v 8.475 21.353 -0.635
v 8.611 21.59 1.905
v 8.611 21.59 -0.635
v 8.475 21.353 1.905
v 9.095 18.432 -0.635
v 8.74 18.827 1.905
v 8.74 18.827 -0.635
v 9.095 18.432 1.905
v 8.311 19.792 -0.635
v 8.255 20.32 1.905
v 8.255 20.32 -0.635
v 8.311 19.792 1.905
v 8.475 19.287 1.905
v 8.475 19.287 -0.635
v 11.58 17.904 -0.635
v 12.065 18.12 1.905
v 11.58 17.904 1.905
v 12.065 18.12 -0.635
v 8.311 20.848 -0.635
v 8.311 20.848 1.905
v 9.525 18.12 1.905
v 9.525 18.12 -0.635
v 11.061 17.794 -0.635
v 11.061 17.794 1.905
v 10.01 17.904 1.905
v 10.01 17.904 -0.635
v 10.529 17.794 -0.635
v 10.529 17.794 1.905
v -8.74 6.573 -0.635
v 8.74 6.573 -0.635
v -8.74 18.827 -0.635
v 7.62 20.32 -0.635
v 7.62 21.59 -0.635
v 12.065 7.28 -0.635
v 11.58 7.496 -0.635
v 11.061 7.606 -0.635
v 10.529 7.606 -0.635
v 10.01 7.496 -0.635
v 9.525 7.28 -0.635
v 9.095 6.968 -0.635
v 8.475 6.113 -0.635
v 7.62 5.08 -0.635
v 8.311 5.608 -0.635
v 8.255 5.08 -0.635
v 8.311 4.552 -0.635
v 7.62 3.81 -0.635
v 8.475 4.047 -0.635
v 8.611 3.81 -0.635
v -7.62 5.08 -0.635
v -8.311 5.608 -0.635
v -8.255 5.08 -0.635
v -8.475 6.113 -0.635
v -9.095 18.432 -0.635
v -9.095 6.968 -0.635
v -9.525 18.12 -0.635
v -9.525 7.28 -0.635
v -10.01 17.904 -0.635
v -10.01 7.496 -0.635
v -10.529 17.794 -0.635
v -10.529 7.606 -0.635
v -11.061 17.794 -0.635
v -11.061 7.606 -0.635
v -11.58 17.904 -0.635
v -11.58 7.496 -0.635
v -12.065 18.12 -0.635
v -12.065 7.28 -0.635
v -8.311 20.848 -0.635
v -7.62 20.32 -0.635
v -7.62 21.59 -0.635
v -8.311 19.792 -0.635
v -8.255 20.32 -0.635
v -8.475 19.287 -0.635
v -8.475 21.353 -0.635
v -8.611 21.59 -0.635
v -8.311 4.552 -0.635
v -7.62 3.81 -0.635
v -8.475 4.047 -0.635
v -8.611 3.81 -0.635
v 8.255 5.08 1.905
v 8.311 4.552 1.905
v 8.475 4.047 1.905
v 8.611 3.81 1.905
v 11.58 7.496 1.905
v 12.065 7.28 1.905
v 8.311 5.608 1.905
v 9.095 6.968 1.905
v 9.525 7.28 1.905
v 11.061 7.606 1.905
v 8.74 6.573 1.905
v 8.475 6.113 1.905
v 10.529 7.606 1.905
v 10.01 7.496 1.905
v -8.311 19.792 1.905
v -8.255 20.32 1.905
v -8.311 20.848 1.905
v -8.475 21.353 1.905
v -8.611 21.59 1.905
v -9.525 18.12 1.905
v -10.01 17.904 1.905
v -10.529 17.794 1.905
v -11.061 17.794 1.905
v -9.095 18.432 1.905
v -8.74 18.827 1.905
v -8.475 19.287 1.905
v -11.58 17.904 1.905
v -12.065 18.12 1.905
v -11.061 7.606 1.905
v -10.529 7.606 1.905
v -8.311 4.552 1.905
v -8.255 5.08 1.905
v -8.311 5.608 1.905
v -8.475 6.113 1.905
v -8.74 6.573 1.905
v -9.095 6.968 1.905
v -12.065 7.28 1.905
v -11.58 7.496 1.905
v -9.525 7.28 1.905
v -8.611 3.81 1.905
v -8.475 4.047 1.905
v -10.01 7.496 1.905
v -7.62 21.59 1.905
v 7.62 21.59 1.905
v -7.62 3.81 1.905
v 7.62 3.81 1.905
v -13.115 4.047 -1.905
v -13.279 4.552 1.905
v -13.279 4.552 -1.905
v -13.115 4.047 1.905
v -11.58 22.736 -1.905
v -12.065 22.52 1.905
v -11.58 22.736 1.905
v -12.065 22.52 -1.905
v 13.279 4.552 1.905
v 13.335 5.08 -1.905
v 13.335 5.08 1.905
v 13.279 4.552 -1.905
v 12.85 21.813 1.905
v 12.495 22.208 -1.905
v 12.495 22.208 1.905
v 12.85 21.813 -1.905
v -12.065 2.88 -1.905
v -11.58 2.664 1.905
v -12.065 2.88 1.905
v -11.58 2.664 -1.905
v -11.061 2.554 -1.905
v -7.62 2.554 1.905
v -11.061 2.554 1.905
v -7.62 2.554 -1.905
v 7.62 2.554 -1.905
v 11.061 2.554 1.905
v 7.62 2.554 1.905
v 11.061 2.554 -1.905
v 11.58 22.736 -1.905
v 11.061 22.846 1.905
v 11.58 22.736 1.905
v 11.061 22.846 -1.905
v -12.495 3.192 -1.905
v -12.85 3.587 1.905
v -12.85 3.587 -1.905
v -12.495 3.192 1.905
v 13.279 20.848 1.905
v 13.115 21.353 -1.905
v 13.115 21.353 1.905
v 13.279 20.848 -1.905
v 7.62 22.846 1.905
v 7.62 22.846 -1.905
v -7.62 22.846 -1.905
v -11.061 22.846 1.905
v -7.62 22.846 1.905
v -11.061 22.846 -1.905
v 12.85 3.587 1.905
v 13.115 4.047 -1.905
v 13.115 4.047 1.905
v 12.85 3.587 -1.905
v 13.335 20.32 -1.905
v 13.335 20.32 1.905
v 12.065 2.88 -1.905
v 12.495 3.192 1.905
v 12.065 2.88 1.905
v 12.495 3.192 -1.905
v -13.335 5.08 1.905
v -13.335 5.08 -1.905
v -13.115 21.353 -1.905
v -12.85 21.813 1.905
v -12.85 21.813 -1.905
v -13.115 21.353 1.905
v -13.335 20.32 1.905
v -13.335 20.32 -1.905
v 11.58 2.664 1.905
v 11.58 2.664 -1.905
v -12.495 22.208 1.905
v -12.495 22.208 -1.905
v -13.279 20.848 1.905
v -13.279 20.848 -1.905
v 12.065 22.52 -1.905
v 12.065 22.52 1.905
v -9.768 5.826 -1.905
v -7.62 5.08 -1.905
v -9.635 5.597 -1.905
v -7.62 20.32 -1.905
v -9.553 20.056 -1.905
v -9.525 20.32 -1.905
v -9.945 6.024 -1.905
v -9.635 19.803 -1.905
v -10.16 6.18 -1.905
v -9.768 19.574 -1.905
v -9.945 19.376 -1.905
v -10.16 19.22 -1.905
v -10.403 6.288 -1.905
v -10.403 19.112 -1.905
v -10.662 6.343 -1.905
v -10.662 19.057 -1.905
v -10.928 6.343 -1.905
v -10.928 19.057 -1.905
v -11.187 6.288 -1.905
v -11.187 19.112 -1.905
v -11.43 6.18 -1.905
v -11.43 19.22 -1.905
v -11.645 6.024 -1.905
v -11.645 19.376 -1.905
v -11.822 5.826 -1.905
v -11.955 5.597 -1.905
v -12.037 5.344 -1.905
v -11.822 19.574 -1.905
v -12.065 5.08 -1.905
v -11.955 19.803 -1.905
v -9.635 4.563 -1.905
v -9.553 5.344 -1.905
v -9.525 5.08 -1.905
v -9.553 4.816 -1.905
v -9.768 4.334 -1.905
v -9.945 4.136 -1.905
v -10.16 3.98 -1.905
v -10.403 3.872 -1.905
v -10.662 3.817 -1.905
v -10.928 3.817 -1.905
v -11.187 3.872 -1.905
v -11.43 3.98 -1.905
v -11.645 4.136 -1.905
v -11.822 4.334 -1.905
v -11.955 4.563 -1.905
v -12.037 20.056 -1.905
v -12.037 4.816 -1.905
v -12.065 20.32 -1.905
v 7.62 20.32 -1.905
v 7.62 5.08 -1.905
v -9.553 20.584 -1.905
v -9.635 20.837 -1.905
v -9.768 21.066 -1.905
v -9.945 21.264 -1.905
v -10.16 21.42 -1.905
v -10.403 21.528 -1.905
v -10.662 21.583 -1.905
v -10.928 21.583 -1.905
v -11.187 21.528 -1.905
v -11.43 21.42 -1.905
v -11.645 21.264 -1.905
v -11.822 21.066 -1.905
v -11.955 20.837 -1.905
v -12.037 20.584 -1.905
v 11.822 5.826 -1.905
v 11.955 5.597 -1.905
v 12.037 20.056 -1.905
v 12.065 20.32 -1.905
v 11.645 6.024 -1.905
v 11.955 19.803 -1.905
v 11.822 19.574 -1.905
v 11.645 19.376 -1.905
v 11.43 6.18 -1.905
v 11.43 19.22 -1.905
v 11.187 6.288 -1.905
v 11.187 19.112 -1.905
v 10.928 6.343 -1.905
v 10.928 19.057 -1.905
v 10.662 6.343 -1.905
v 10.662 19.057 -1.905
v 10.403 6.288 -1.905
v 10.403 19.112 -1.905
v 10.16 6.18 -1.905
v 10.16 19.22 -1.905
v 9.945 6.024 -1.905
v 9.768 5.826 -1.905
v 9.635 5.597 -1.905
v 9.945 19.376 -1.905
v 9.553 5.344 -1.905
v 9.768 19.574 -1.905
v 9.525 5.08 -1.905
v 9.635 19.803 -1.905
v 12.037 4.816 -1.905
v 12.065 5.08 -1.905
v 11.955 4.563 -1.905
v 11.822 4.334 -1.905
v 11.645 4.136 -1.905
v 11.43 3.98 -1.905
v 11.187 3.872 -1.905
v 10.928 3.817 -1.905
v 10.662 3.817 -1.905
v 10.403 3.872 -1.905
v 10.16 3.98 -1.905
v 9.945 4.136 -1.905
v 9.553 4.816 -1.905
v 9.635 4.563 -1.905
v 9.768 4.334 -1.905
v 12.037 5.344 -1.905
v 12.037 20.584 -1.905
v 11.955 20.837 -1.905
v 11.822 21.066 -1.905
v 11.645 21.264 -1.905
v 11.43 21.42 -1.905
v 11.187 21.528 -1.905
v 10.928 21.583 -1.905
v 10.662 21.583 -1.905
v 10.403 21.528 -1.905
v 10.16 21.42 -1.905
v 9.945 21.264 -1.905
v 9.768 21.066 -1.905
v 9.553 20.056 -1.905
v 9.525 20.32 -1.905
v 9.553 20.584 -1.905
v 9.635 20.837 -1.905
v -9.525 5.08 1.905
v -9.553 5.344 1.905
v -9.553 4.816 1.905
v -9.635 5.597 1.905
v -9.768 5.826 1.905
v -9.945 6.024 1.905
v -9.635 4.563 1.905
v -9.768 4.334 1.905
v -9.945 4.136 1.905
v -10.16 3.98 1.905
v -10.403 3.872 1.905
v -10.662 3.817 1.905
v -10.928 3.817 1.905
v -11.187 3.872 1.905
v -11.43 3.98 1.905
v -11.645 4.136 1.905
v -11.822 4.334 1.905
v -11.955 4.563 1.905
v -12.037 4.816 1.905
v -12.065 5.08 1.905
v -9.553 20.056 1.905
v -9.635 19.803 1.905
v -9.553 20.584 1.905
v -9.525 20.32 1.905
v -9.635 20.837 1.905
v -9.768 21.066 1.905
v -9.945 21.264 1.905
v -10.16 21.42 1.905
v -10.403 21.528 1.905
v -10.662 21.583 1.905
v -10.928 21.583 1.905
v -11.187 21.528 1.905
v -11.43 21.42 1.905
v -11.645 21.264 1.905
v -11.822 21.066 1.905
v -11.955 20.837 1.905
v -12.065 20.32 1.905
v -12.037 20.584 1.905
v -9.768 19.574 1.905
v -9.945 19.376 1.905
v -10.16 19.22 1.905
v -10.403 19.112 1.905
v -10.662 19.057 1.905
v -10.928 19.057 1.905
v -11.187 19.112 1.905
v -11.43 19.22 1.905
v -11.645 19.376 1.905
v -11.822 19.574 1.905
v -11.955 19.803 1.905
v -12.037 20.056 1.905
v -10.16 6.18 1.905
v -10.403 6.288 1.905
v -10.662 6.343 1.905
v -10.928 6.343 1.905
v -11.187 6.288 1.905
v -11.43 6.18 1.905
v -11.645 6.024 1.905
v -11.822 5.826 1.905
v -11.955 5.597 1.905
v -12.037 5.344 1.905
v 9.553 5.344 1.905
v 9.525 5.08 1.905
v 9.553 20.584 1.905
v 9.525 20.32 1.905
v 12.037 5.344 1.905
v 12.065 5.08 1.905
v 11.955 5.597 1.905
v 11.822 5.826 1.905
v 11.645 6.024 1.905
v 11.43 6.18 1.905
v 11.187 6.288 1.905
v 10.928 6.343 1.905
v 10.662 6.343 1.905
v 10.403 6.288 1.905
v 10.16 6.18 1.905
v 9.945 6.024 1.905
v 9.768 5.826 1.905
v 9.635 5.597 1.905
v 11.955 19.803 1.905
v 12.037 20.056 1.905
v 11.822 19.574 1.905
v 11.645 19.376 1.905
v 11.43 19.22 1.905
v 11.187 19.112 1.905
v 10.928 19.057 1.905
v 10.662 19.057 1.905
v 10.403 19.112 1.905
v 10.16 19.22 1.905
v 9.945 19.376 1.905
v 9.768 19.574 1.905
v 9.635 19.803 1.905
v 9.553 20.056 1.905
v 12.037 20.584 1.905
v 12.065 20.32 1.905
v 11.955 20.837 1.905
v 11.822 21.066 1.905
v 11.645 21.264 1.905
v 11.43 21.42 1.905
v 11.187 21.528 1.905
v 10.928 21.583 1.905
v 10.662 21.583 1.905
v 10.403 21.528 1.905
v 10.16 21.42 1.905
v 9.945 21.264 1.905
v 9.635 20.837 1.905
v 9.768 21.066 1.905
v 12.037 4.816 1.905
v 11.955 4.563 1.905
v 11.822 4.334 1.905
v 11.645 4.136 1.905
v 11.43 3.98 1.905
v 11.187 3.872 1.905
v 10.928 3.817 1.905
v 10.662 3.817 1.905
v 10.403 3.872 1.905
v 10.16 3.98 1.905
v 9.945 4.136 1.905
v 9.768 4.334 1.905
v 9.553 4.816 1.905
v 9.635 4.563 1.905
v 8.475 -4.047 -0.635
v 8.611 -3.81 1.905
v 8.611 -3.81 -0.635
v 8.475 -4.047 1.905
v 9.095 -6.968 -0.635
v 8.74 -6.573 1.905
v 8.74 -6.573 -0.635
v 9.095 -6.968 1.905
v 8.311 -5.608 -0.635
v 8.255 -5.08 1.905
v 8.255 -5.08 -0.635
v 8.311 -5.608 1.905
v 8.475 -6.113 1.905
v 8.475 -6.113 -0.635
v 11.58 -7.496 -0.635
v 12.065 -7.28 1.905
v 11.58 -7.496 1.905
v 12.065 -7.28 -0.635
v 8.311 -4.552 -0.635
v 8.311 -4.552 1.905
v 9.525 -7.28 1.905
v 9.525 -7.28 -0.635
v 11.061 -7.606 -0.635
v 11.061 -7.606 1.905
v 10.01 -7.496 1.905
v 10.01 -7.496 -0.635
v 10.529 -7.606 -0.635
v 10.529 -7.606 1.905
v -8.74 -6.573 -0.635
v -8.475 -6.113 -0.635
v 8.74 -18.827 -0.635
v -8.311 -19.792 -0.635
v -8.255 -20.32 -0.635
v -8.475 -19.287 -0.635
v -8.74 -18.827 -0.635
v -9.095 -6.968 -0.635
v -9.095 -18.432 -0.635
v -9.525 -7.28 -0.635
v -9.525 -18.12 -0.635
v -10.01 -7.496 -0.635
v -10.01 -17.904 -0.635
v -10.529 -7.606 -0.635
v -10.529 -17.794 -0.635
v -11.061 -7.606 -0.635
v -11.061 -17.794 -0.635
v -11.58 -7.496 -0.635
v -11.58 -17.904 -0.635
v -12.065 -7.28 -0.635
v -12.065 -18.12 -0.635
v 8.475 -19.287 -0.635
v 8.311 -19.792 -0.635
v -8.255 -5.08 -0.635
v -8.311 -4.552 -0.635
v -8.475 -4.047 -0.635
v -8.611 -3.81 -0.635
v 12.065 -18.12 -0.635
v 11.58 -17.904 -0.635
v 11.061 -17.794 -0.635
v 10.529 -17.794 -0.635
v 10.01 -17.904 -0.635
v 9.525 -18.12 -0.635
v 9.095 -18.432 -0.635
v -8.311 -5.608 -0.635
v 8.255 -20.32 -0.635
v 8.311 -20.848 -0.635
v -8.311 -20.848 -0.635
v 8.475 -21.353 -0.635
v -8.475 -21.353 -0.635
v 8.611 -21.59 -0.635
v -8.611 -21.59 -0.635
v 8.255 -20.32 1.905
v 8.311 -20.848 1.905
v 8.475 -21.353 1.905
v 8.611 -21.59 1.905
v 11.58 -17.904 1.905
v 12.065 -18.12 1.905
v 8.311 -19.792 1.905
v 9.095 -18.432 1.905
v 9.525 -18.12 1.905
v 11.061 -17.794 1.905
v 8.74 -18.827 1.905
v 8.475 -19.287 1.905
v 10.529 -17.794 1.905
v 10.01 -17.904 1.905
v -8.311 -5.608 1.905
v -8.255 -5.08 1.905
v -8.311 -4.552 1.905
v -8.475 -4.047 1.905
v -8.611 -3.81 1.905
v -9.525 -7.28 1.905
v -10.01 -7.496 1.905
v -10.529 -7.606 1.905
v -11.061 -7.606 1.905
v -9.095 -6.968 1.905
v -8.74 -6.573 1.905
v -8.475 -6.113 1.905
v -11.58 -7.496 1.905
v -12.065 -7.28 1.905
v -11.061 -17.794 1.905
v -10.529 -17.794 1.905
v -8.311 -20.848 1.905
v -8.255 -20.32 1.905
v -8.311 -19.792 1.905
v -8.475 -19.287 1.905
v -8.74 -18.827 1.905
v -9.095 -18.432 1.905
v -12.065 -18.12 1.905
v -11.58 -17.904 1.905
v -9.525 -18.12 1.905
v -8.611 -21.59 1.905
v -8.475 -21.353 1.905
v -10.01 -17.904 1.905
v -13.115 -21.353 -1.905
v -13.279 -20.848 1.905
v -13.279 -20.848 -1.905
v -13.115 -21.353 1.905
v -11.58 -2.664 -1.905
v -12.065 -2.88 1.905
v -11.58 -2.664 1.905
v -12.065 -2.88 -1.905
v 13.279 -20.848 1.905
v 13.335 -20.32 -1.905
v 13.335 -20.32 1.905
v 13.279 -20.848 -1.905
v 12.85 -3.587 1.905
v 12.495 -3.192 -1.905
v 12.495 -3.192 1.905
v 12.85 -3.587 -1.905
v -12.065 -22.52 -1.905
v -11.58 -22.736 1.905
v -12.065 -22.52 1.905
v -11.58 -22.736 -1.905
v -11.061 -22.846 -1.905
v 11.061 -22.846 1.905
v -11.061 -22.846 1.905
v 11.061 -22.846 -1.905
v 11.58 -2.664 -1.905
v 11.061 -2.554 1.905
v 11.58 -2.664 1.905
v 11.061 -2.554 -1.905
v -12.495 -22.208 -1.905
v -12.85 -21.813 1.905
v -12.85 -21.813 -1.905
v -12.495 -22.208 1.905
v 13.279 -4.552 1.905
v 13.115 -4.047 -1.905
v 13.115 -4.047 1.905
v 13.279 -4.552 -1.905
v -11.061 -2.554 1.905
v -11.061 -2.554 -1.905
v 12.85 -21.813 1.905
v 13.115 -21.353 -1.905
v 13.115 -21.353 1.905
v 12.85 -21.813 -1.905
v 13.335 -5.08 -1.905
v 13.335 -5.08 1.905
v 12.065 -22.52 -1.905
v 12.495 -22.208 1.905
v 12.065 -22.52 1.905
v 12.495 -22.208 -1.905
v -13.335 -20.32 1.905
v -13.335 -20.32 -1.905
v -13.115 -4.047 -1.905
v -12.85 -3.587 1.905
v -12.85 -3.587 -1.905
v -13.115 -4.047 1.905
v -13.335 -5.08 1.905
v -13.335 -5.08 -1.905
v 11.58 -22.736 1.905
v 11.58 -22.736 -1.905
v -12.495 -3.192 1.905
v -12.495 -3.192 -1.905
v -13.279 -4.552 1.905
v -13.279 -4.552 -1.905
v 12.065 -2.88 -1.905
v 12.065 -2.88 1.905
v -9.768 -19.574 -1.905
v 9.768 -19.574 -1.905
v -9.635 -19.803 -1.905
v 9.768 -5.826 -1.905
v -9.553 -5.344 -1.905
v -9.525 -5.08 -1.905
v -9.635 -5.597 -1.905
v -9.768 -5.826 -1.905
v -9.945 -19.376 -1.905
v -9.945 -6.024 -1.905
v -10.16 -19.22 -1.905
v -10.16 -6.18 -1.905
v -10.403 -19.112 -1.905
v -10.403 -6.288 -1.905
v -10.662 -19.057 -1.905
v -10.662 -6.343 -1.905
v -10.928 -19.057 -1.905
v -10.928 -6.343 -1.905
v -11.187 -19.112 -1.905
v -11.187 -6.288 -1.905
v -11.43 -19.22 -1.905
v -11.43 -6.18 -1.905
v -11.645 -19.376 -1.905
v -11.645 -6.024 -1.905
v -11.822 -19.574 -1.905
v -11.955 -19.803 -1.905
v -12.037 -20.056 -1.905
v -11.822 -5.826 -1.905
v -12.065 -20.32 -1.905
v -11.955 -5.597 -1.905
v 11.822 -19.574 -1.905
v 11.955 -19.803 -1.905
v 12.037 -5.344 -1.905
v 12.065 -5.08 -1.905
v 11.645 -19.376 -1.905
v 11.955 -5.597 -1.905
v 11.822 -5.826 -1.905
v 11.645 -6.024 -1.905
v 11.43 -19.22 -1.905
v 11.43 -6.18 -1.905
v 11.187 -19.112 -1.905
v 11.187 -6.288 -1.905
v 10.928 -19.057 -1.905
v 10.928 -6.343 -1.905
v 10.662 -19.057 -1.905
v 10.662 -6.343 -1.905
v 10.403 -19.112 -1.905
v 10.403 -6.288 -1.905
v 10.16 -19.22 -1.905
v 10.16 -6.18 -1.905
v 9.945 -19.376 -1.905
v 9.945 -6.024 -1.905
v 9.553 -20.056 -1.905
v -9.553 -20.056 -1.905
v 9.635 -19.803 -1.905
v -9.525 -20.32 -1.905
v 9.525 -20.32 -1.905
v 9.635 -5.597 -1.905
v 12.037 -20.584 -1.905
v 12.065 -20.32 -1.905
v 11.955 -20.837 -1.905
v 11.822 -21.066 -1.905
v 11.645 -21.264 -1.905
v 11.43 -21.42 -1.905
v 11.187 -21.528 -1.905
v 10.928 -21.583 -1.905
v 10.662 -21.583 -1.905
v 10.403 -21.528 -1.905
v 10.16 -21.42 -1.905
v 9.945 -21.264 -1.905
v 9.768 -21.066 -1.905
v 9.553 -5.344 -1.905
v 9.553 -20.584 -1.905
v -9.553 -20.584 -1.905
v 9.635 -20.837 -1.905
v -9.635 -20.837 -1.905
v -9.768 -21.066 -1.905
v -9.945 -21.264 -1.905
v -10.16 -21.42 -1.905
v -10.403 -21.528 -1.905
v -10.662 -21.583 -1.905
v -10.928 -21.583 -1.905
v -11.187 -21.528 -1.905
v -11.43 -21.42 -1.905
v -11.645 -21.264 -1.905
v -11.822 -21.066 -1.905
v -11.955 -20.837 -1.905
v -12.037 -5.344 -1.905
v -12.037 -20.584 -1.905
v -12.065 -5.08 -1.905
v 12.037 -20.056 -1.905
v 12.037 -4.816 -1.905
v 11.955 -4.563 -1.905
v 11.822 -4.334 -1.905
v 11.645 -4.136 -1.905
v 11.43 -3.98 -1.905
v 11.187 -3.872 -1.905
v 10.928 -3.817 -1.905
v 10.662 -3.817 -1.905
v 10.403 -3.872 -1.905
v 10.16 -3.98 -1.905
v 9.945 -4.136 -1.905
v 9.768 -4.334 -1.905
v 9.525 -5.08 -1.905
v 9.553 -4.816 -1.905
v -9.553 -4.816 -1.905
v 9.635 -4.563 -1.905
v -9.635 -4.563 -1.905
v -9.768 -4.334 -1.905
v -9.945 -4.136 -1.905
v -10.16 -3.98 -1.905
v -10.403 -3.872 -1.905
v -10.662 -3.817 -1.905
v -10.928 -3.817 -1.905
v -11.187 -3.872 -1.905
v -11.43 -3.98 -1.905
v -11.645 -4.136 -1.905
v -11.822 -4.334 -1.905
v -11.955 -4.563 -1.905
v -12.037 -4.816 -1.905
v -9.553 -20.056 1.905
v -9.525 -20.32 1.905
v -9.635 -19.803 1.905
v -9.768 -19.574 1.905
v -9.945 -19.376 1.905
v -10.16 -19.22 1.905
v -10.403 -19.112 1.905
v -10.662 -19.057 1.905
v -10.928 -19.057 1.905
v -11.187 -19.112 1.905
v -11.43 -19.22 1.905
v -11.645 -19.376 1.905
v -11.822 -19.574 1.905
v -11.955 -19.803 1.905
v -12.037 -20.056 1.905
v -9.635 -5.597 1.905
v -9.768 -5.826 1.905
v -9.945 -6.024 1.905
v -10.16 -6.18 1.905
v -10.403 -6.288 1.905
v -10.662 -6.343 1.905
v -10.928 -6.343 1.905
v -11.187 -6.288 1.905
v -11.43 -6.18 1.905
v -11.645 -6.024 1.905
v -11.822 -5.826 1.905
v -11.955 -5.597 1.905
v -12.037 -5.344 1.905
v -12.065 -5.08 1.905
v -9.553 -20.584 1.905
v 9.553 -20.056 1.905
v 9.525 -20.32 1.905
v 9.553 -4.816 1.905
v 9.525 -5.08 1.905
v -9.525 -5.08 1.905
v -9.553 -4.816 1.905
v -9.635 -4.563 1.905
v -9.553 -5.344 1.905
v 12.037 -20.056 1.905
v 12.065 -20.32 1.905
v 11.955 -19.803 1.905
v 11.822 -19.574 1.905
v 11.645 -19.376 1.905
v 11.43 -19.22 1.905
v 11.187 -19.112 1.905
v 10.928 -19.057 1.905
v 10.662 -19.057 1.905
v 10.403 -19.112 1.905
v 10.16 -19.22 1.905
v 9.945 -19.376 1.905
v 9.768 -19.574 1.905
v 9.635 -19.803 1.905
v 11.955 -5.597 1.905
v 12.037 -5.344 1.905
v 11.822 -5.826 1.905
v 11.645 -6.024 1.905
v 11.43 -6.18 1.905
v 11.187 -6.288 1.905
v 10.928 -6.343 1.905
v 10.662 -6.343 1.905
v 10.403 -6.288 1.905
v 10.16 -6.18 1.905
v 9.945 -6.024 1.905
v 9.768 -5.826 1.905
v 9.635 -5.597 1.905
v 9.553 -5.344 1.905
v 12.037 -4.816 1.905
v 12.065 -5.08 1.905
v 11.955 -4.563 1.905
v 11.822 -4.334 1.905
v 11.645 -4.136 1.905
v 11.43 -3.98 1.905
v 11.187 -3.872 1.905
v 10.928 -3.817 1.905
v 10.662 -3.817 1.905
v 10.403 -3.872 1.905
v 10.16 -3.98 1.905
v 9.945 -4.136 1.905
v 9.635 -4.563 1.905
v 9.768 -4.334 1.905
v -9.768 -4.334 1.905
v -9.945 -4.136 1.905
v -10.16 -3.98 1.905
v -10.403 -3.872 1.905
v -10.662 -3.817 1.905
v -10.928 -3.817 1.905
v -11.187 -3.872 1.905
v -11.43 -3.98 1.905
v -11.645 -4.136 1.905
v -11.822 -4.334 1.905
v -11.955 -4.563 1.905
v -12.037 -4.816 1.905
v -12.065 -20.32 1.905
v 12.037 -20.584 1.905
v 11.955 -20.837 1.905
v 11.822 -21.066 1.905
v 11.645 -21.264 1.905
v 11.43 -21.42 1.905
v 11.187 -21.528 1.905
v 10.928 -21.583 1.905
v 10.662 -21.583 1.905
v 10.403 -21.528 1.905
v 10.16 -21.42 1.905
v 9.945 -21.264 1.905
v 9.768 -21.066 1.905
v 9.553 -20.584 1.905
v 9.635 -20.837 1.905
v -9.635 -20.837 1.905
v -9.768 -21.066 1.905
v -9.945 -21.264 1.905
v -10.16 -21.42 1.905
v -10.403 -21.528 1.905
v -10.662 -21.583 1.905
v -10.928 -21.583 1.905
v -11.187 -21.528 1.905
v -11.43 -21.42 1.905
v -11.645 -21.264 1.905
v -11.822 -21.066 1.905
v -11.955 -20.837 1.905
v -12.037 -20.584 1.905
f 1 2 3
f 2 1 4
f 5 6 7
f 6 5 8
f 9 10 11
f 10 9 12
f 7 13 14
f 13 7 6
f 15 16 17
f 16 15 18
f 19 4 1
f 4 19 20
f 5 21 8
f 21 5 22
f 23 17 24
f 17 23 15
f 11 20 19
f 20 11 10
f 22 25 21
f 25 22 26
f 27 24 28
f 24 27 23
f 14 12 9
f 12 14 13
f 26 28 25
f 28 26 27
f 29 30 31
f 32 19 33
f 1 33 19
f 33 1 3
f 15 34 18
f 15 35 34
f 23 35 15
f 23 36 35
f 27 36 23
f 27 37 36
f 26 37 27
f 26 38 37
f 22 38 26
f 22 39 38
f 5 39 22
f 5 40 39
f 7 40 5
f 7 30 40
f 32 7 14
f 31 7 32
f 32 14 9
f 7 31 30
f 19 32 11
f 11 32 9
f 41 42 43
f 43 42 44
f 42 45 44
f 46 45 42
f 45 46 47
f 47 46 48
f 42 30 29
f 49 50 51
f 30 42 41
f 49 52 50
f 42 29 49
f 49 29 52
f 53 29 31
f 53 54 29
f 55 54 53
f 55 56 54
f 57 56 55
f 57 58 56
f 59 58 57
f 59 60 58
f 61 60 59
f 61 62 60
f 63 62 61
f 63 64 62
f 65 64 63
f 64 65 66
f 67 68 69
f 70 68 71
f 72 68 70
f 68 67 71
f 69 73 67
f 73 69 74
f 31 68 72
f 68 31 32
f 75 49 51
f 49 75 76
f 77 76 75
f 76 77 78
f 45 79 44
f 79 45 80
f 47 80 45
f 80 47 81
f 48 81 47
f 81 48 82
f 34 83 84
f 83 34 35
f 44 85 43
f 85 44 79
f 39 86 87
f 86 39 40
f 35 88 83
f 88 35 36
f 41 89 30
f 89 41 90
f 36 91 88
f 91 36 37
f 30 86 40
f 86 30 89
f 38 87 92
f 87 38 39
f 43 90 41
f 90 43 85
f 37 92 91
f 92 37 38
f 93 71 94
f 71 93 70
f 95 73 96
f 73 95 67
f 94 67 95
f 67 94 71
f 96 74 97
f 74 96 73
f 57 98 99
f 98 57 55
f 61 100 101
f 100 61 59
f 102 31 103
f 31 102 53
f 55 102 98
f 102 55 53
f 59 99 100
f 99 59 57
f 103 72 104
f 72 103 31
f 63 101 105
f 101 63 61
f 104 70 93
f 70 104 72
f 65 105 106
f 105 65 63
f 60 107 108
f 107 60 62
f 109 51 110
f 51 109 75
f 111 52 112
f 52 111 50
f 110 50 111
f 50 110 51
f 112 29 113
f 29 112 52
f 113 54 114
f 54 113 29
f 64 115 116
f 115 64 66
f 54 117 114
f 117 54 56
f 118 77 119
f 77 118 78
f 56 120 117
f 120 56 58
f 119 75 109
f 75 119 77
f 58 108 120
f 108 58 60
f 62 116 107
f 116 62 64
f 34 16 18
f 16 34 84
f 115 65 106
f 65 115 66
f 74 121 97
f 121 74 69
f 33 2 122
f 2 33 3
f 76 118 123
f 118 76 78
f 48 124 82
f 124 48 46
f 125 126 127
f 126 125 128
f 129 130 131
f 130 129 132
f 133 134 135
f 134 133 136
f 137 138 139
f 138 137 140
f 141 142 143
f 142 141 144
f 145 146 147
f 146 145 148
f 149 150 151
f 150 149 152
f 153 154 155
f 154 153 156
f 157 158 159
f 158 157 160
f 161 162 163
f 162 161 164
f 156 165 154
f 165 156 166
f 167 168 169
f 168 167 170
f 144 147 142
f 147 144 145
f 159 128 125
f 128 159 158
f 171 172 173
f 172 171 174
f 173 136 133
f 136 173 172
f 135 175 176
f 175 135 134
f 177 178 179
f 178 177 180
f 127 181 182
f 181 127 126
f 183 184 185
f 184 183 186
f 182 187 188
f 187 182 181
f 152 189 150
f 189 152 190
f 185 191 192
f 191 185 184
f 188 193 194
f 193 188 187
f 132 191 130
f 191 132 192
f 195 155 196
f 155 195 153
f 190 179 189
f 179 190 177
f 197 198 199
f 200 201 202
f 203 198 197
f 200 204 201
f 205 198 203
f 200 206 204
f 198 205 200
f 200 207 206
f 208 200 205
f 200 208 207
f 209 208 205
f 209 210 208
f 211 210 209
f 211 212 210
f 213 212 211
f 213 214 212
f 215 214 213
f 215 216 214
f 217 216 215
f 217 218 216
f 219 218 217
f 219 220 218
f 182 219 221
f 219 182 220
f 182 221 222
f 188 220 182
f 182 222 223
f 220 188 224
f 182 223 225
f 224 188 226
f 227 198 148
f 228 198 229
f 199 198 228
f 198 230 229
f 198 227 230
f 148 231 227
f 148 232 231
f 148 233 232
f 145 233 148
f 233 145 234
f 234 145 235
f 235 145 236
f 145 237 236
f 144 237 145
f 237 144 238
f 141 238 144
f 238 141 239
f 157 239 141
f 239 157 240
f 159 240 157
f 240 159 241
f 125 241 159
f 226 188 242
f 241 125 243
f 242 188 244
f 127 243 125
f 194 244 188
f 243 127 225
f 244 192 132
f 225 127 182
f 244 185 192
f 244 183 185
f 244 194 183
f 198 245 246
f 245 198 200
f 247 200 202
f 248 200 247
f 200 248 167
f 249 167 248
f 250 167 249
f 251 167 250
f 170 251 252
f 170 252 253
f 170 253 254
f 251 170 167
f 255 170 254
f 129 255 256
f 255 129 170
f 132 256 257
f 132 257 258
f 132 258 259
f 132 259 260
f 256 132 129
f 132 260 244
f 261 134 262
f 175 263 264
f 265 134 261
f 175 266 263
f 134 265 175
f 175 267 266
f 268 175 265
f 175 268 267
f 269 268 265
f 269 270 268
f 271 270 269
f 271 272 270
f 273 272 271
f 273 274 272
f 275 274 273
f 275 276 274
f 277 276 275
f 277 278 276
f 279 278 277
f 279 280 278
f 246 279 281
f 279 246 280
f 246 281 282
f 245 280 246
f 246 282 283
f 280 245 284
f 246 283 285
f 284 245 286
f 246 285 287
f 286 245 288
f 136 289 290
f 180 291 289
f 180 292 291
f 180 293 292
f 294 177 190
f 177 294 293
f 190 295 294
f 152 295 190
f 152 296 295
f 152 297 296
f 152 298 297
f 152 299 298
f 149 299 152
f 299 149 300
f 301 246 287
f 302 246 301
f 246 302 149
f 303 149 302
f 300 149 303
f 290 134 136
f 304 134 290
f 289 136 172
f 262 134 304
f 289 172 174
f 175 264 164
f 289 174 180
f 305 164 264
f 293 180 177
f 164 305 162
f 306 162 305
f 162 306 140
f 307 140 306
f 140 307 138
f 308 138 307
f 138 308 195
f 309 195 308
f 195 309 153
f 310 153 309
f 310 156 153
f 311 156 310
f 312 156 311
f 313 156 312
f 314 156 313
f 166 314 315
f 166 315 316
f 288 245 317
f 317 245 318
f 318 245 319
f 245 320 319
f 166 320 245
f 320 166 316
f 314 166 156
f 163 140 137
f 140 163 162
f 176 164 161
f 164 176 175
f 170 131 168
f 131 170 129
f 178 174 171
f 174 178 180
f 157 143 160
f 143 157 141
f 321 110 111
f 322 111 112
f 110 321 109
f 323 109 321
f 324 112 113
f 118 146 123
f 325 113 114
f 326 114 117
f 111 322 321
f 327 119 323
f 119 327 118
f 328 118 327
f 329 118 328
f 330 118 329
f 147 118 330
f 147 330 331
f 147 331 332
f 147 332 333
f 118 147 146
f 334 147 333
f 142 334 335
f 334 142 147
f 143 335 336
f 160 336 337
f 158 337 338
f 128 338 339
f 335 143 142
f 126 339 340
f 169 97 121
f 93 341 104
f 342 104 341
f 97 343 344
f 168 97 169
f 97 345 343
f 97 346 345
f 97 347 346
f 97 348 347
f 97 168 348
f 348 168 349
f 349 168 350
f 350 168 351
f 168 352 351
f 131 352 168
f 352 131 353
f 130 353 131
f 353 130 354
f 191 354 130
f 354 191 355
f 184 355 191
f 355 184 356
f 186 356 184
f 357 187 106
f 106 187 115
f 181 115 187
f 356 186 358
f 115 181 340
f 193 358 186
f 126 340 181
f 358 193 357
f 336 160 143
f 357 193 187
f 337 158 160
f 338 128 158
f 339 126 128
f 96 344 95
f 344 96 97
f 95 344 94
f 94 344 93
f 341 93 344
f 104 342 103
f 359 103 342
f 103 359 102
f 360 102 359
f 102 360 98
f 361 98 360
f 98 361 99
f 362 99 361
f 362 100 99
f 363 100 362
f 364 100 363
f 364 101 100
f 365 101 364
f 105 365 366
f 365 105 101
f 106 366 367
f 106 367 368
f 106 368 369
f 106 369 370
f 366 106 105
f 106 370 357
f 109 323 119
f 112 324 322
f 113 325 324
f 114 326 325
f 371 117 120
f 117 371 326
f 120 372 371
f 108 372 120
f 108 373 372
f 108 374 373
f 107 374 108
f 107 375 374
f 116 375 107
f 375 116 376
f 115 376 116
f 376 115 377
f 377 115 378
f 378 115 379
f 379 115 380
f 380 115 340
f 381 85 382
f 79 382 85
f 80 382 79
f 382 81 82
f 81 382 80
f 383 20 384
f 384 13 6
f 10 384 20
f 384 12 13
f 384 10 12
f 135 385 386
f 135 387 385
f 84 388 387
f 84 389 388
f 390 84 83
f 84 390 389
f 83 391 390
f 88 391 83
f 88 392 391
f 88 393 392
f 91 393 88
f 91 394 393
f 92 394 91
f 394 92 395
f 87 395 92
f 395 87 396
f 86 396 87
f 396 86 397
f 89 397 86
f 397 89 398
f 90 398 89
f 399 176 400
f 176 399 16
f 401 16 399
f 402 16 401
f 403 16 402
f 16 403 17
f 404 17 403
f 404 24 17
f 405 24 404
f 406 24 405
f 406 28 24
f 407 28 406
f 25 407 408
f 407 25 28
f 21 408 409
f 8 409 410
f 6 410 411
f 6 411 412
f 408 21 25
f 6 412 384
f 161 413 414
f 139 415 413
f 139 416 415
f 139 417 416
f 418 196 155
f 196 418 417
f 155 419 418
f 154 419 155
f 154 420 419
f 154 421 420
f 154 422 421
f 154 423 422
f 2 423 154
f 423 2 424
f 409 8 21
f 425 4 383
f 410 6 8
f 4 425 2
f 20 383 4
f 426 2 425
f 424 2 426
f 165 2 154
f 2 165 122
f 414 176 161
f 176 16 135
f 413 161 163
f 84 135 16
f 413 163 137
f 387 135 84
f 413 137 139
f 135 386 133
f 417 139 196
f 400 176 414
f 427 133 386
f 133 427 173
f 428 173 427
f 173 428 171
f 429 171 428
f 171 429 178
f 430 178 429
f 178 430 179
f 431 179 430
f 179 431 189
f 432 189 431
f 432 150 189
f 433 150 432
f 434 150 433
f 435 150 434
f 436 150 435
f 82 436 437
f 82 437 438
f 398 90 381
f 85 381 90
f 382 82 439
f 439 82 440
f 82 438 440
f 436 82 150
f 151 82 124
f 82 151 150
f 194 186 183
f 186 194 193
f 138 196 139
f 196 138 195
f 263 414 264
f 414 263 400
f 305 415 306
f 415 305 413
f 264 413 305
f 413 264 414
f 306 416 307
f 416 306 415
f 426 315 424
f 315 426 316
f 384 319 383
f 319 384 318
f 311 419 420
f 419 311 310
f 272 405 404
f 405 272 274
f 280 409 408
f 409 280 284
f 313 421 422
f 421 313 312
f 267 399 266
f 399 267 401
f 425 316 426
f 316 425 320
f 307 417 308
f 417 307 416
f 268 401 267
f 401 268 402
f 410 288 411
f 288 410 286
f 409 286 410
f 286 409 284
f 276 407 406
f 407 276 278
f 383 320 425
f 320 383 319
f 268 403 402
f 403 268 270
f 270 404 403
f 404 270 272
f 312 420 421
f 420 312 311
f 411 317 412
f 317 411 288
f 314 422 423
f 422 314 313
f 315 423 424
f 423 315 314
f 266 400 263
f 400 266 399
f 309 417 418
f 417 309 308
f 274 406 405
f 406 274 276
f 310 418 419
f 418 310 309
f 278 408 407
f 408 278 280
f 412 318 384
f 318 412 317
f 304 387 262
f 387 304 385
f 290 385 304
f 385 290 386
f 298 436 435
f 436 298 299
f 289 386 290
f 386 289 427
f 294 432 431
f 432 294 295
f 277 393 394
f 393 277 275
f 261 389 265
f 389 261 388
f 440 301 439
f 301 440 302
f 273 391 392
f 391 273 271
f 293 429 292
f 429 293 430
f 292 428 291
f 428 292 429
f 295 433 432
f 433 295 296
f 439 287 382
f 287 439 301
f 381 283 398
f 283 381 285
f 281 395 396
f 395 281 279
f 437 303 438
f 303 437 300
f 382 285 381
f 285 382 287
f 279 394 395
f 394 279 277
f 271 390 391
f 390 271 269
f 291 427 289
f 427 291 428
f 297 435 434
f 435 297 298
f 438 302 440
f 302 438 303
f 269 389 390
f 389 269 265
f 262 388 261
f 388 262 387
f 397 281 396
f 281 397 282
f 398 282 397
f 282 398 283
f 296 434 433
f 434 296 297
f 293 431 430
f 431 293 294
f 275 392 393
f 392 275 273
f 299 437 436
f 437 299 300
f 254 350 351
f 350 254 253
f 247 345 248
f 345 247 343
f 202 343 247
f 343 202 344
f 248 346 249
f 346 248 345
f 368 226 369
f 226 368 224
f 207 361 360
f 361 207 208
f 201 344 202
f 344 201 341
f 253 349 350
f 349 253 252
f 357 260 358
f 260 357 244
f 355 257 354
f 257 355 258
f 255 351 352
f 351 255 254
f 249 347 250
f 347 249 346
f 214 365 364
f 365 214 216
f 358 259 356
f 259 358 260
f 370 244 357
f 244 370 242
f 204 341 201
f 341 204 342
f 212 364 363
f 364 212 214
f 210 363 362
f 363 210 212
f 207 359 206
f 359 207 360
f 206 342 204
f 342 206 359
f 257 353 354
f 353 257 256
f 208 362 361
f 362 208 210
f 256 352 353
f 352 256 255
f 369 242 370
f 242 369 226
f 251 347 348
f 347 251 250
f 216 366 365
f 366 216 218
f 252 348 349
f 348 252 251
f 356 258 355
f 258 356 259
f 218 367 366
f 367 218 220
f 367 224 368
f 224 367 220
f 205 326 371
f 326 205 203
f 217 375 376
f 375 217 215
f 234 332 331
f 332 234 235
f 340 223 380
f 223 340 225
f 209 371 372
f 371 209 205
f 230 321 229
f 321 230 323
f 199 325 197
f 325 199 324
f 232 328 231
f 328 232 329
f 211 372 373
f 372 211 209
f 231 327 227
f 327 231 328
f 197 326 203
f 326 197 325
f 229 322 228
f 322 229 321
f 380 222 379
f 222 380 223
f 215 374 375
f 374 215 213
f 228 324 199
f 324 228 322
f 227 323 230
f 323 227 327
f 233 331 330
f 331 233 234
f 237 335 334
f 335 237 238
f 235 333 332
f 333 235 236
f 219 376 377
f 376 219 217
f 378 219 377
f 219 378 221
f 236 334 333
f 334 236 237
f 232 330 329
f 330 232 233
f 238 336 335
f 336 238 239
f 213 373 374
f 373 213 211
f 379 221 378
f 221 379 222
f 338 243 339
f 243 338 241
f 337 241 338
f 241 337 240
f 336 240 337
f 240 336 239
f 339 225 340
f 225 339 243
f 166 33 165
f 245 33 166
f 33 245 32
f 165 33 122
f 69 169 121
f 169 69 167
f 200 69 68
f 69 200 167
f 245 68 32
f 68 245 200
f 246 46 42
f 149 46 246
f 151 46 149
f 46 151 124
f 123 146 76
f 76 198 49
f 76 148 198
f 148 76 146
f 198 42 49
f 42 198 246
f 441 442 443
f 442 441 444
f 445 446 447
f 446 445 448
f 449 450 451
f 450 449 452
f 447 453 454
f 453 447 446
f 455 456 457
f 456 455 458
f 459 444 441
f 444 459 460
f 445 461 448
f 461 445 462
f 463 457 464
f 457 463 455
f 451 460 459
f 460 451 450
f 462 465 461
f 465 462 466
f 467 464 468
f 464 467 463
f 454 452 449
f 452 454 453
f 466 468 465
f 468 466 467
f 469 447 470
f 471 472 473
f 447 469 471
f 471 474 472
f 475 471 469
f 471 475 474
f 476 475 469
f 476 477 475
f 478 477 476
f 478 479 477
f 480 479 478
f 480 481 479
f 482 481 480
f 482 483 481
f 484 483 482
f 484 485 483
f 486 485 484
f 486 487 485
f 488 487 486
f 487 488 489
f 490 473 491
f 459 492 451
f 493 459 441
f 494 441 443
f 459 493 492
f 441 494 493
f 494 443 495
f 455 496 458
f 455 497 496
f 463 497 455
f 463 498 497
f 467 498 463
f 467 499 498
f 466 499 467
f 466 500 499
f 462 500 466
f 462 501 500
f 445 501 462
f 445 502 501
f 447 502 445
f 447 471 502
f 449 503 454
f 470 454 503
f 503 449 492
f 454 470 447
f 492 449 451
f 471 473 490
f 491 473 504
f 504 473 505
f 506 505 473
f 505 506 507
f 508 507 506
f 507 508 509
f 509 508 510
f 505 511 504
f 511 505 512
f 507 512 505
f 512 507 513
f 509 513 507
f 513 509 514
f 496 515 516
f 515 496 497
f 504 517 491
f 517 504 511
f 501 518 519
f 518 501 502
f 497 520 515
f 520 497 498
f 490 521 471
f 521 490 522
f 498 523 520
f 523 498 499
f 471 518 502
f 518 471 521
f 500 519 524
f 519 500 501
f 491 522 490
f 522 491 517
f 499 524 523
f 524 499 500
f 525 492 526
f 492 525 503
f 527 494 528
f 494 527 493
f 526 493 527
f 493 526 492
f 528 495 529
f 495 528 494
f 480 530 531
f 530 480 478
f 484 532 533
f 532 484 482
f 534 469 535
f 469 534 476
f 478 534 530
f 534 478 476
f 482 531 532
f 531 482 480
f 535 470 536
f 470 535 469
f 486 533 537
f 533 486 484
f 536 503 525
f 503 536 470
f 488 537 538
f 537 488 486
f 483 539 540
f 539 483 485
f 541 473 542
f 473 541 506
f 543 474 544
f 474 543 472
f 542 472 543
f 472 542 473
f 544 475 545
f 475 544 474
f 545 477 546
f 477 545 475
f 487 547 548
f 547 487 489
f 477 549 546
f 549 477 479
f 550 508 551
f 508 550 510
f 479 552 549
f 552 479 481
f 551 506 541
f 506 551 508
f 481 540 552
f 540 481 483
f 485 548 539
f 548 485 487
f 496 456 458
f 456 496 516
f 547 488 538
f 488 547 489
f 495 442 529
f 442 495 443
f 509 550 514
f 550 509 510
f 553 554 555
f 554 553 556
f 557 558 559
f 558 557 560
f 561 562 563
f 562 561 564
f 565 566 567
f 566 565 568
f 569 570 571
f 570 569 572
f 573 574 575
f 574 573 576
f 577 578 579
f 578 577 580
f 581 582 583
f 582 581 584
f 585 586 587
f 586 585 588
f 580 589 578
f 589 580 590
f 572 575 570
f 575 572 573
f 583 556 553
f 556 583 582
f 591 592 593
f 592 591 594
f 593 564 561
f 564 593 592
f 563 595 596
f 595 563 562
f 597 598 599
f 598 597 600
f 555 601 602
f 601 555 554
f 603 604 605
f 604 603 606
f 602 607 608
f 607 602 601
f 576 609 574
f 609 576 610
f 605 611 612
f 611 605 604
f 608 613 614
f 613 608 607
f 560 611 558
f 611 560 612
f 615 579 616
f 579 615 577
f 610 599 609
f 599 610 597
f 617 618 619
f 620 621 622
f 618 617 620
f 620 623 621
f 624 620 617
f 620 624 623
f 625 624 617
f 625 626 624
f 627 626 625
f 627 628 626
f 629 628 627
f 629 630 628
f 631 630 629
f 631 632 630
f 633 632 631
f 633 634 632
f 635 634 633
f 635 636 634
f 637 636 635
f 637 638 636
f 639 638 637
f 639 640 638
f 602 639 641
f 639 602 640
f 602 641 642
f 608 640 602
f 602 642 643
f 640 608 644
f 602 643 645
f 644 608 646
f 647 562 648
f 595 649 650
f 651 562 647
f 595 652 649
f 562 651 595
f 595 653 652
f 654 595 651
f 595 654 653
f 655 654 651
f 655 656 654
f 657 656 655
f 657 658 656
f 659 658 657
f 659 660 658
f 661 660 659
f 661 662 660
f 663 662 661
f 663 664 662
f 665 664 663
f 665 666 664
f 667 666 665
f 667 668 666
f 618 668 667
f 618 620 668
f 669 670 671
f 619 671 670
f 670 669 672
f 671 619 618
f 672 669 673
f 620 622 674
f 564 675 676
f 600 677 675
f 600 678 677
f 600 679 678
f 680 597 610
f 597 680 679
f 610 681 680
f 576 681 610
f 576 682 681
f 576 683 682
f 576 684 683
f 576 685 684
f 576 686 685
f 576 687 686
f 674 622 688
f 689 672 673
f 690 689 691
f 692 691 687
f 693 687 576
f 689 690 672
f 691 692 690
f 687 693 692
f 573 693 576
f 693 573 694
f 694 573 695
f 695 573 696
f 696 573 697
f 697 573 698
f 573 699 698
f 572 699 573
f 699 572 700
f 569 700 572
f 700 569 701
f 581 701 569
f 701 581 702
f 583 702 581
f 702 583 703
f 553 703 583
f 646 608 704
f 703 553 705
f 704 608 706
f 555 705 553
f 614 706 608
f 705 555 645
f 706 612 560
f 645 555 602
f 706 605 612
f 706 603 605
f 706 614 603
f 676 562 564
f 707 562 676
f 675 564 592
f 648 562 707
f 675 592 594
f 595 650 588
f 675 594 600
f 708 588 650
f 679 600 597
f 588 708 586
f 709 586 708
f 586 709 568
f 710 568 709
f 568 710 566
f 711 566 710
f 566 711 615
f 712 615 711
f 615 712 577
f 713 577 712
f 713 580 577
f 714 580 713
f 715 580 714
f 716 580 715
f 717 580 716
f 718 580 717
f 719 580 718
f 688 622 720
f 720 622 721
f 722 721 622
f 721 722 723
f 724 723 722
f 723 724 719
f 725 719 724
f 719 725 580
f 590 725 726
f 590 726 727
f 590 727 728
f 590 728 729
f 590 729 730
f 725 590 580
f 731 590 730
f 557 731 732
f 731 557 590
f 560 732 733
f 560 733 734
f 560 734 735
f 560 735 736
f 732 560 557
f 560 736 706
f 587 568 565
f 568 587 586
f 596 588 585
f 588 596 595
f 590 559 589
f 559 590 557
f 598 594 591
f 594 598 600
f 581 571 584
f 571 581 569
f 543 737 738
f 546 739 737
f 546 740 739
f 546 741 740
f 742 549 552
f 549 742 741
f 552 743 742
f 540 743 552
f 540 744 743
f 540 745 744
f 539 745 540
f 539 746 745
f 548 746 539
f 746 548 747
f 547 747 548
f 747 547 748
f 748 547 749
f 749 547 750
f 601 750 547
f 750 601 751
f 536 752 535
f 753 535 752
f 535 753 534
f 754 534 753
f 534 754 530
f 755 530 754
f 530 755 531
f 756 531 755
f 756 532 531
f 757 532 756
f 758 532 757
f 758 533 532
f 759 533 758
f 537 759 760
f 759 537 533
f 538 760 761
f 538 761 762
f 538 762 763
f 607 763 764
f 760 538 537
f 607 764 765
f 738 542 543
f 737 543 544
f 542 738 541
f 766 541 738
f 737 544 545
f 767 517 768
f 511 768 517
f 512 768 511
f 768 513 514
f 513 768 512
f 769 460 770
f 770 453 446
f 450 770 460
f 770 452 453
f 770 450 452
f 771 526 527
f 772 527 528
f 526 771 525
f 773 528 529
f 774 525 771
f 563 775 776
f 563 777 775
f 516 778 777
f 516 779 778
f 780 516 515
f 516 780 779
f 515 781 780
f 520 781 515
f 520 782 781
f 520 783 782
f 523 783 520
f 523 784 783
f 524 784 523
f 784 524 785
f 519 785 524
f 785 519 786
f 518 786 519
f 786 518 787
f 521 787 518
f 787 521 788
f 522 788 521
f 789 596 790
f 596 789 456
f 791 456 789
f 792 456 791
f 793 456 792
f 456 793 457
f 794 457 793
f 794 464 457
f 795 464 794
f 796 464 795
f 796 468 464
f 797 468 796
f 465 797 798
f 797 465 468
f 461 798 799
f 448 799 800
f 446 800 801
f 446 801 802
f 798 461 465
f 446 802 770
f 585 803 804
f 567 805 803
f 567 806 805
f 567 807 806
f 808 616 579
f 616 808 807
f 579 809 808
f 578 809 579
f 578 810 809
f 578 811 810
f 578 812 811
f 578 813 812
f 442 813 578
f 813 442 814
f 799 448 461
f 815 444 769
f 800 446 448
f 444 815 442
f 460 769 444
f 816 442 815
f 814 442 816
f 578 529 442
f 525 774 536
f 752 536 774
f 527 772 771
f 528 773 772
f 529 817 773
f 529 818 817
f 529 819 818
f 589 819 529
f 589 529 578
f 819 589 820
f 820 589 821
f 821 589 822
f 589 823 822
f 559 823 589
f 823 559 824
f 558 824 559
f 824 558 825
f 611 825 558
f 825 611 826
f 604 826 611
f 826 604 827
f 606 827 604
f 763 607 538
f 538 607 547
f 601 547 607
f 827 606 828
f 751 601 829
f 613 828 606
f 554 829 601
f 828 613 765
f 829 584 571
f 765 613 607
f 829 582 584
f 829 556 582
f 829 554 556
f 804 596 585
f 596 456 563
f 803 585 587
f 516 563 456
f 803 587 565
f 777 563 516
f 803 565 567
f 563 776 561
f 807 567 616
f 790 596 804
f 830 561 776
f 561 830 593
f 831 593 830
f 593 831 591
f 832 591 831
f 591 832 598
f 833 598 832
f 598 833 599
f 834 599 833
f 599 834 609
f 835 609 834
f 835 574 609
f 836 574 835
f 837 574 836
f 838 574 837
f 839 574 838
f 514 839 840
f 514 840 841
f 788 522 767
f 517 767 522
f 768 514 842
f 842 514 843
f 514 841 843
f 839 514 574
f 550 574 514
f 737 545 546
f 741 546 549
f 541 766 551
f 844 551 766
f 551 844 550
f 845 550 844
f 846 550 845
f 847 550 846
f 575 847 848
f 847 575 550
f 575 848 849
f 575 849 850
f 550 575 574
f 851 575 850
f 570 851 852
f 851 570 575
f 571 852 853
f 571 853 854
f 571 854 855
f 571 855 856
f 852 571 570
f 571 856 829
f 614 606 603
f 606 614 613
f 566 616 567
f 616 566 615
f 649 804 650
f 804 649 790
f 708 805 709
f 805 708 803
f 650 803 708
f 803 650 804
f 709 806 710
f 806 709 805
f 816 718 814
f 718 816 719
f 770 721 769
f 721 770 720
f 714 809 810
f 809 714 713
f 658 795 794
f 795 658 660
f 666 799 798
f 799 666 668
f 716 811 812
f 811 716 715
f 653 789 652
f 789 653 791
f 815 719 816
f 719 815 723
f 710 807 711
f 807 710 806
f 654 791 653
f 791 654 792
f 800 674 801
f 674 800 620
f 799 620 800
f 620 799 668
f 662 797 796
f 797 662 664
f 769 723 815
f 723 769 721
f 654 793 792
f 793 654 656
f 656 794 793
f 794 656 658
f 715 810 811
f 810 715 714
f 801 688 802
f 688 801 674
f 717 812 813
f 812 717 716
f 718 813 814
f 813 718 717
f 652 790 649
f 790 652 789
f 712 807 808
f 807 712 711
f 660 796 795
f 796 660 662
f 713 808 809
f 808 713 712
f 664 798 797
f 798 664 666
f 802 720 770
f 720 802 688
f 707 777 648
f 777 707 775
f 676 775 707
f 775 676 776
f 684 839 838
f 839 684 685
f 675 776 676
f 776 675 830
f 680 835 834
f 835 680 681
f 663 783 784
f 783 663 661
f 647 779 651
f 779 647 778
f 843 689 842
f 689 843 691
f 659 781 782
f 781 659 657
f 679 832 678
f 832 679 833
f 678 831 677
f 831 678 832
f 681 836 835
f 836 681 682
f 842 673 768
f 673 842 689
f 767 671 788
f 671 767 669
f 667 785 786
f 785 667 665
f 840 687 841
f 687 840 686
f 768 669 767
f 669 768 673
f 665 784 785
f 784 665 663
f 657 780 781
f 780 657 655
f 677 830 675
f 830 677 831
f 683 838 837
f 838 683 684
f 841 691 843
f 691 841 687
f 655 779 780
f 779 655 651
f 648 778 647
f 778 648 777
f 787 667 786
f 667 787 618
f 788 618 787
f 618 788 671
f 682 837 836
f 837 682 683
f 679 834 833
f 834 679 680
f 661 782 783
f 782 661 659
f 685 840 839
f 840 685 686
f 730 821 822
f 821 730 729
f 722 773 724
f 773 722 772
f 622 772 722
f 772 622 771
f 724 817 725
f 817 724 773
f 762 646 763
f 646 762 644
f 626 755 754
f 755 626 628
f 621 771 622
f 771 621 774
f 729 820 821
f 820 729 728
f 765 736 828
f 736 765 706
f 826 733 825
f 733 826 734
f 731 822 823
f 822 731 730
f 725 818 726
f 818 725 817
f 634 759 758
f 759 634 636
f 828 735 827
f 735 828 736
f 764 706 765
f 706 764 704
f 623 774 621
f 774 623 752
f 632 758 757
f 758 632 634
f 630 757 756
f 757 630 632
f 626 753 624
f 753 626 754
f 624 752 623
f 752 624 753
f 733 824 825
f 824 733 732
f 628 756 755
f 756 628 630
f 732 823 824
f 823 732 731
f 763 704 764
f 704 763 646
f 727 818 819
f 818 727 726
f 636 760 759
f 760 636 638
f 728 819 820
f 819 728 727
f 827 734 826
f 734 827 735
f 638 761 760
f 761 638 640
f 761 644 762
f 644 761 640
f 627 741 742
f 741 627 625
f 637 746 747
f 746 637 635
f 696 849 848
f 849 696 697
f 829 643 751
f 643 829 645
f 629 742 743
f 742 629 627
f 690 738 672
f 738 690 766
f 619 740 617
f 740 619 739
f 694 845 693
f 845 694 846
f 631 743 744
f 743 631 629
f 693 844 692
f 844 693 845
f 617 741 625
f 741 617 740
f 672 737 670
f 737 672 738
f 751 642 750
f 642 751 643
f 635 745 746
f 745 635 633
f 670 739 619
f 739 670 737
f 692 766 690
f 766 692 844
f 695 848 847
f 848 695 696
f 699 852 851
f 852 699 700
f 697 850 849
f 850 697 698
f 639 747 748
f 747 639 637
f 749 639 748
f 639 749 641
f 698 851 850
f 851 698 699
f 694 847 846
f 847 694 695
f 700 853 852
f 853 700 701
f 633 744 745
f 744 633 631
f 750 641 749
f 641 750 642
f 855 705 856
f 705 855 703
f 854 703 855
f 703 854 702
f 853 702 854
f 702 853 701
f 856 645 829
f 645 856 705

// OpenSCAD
function mm(inches) = inches * 25.4;

$fs = 0.01;
width         = mm(1.05);
length        = mm(0.80);
height        = mm(0.15);
thickness     = mm(0.05);
hole_radius   = mm(0.05);
header_width  = mm(0.60);
header_length = mm(0.10);
round_corners = true;

// some derived constants for later calculations
radius = hole_radius + thickness;
diam = radius * 2;
x = (width / 2) - radius;
y = (length / 2) - radius;

// draws in the four cylinders that define the corners of the enclosure
module corners()
{
    if(round_corners) {
        translate([x,y,0.0]) cylinder(h=height, r=radius, center=true);
        translate([x,-y,0.0]) cylinder(h=height, r=radius, center=true);
        translate([-x,y,0.0]) cylinder(h=height, r=radius, center=true);
        translate([-x,-y,0.0]) cylinder(h=height, r=radius, center=true);
    } else {
        translate([x,y,0.0]) cube([diam,diam,height], center=true);
        translate([x,-y,0.0]) cube([diam,diam,height], center=true);
        translate([-x,y,0.0]) cube([diam,diam,height], center=true);
        translate([-x,-y,0.0]) cube([diam,diam,height], center=true);
    }
}

module body()
{
    hull() corners();
}

// slots for header access, top plate only
module slots()
{
    y2 = ((length - header_length) / 2) + 0.1;
    translate([0.0,y2,0.0]) cube([header_width,header_length+0.2,height+0.1], true);
    translate([0.0,-y2,0.0]) cube([header_width,header_length+0.2,height+0.1], true);
}

module bot_plate()
{
    difference() {
        body();
        // holes for bolts
        translate([x,y,0.0]) cylinder(height+0.1, r=hole_radius, center=true);
        translate([x,-y,0.0]) cylinder(height+0.1, r=hole_radius, center=true);
        translate([-x,y,0.0]) cylinder(height+0.1, r=hole_radius, center=true);
        translate([-x,-y,0.0]) cylinder(height+0.1, r=hole_radius, center=true);
        // hollow out the insides
        translate([0.0,0.0,thickness]) difference() {
            body();
            corners();
            // define the walls
            x3 = (width - thickness) / 2.0;
            y3 = (length - thickness) / 2.0;
            translate([x3,0.0,0.0]) cube([thickness,length,height], center=true);
            translate([-x3,0.0,0.0]) cube([thickness,length,height], center=true);
            translate([0.0,y3,0.0]) cube([width,thickness,height], center=true);
            translate([0.0,-y3,0.0]) cube([width,thickness,height], center=true);
        }
    }
}

// same as bot_plate, but with the header slots
module top_plate()
{
    difference() {
        bot_plate();
        slots();
    }
}

translate([0.0,mm(0.5),0.0]) top_plate();
translate([0.0,mm(-0.5),0.0]) bot_plate();
